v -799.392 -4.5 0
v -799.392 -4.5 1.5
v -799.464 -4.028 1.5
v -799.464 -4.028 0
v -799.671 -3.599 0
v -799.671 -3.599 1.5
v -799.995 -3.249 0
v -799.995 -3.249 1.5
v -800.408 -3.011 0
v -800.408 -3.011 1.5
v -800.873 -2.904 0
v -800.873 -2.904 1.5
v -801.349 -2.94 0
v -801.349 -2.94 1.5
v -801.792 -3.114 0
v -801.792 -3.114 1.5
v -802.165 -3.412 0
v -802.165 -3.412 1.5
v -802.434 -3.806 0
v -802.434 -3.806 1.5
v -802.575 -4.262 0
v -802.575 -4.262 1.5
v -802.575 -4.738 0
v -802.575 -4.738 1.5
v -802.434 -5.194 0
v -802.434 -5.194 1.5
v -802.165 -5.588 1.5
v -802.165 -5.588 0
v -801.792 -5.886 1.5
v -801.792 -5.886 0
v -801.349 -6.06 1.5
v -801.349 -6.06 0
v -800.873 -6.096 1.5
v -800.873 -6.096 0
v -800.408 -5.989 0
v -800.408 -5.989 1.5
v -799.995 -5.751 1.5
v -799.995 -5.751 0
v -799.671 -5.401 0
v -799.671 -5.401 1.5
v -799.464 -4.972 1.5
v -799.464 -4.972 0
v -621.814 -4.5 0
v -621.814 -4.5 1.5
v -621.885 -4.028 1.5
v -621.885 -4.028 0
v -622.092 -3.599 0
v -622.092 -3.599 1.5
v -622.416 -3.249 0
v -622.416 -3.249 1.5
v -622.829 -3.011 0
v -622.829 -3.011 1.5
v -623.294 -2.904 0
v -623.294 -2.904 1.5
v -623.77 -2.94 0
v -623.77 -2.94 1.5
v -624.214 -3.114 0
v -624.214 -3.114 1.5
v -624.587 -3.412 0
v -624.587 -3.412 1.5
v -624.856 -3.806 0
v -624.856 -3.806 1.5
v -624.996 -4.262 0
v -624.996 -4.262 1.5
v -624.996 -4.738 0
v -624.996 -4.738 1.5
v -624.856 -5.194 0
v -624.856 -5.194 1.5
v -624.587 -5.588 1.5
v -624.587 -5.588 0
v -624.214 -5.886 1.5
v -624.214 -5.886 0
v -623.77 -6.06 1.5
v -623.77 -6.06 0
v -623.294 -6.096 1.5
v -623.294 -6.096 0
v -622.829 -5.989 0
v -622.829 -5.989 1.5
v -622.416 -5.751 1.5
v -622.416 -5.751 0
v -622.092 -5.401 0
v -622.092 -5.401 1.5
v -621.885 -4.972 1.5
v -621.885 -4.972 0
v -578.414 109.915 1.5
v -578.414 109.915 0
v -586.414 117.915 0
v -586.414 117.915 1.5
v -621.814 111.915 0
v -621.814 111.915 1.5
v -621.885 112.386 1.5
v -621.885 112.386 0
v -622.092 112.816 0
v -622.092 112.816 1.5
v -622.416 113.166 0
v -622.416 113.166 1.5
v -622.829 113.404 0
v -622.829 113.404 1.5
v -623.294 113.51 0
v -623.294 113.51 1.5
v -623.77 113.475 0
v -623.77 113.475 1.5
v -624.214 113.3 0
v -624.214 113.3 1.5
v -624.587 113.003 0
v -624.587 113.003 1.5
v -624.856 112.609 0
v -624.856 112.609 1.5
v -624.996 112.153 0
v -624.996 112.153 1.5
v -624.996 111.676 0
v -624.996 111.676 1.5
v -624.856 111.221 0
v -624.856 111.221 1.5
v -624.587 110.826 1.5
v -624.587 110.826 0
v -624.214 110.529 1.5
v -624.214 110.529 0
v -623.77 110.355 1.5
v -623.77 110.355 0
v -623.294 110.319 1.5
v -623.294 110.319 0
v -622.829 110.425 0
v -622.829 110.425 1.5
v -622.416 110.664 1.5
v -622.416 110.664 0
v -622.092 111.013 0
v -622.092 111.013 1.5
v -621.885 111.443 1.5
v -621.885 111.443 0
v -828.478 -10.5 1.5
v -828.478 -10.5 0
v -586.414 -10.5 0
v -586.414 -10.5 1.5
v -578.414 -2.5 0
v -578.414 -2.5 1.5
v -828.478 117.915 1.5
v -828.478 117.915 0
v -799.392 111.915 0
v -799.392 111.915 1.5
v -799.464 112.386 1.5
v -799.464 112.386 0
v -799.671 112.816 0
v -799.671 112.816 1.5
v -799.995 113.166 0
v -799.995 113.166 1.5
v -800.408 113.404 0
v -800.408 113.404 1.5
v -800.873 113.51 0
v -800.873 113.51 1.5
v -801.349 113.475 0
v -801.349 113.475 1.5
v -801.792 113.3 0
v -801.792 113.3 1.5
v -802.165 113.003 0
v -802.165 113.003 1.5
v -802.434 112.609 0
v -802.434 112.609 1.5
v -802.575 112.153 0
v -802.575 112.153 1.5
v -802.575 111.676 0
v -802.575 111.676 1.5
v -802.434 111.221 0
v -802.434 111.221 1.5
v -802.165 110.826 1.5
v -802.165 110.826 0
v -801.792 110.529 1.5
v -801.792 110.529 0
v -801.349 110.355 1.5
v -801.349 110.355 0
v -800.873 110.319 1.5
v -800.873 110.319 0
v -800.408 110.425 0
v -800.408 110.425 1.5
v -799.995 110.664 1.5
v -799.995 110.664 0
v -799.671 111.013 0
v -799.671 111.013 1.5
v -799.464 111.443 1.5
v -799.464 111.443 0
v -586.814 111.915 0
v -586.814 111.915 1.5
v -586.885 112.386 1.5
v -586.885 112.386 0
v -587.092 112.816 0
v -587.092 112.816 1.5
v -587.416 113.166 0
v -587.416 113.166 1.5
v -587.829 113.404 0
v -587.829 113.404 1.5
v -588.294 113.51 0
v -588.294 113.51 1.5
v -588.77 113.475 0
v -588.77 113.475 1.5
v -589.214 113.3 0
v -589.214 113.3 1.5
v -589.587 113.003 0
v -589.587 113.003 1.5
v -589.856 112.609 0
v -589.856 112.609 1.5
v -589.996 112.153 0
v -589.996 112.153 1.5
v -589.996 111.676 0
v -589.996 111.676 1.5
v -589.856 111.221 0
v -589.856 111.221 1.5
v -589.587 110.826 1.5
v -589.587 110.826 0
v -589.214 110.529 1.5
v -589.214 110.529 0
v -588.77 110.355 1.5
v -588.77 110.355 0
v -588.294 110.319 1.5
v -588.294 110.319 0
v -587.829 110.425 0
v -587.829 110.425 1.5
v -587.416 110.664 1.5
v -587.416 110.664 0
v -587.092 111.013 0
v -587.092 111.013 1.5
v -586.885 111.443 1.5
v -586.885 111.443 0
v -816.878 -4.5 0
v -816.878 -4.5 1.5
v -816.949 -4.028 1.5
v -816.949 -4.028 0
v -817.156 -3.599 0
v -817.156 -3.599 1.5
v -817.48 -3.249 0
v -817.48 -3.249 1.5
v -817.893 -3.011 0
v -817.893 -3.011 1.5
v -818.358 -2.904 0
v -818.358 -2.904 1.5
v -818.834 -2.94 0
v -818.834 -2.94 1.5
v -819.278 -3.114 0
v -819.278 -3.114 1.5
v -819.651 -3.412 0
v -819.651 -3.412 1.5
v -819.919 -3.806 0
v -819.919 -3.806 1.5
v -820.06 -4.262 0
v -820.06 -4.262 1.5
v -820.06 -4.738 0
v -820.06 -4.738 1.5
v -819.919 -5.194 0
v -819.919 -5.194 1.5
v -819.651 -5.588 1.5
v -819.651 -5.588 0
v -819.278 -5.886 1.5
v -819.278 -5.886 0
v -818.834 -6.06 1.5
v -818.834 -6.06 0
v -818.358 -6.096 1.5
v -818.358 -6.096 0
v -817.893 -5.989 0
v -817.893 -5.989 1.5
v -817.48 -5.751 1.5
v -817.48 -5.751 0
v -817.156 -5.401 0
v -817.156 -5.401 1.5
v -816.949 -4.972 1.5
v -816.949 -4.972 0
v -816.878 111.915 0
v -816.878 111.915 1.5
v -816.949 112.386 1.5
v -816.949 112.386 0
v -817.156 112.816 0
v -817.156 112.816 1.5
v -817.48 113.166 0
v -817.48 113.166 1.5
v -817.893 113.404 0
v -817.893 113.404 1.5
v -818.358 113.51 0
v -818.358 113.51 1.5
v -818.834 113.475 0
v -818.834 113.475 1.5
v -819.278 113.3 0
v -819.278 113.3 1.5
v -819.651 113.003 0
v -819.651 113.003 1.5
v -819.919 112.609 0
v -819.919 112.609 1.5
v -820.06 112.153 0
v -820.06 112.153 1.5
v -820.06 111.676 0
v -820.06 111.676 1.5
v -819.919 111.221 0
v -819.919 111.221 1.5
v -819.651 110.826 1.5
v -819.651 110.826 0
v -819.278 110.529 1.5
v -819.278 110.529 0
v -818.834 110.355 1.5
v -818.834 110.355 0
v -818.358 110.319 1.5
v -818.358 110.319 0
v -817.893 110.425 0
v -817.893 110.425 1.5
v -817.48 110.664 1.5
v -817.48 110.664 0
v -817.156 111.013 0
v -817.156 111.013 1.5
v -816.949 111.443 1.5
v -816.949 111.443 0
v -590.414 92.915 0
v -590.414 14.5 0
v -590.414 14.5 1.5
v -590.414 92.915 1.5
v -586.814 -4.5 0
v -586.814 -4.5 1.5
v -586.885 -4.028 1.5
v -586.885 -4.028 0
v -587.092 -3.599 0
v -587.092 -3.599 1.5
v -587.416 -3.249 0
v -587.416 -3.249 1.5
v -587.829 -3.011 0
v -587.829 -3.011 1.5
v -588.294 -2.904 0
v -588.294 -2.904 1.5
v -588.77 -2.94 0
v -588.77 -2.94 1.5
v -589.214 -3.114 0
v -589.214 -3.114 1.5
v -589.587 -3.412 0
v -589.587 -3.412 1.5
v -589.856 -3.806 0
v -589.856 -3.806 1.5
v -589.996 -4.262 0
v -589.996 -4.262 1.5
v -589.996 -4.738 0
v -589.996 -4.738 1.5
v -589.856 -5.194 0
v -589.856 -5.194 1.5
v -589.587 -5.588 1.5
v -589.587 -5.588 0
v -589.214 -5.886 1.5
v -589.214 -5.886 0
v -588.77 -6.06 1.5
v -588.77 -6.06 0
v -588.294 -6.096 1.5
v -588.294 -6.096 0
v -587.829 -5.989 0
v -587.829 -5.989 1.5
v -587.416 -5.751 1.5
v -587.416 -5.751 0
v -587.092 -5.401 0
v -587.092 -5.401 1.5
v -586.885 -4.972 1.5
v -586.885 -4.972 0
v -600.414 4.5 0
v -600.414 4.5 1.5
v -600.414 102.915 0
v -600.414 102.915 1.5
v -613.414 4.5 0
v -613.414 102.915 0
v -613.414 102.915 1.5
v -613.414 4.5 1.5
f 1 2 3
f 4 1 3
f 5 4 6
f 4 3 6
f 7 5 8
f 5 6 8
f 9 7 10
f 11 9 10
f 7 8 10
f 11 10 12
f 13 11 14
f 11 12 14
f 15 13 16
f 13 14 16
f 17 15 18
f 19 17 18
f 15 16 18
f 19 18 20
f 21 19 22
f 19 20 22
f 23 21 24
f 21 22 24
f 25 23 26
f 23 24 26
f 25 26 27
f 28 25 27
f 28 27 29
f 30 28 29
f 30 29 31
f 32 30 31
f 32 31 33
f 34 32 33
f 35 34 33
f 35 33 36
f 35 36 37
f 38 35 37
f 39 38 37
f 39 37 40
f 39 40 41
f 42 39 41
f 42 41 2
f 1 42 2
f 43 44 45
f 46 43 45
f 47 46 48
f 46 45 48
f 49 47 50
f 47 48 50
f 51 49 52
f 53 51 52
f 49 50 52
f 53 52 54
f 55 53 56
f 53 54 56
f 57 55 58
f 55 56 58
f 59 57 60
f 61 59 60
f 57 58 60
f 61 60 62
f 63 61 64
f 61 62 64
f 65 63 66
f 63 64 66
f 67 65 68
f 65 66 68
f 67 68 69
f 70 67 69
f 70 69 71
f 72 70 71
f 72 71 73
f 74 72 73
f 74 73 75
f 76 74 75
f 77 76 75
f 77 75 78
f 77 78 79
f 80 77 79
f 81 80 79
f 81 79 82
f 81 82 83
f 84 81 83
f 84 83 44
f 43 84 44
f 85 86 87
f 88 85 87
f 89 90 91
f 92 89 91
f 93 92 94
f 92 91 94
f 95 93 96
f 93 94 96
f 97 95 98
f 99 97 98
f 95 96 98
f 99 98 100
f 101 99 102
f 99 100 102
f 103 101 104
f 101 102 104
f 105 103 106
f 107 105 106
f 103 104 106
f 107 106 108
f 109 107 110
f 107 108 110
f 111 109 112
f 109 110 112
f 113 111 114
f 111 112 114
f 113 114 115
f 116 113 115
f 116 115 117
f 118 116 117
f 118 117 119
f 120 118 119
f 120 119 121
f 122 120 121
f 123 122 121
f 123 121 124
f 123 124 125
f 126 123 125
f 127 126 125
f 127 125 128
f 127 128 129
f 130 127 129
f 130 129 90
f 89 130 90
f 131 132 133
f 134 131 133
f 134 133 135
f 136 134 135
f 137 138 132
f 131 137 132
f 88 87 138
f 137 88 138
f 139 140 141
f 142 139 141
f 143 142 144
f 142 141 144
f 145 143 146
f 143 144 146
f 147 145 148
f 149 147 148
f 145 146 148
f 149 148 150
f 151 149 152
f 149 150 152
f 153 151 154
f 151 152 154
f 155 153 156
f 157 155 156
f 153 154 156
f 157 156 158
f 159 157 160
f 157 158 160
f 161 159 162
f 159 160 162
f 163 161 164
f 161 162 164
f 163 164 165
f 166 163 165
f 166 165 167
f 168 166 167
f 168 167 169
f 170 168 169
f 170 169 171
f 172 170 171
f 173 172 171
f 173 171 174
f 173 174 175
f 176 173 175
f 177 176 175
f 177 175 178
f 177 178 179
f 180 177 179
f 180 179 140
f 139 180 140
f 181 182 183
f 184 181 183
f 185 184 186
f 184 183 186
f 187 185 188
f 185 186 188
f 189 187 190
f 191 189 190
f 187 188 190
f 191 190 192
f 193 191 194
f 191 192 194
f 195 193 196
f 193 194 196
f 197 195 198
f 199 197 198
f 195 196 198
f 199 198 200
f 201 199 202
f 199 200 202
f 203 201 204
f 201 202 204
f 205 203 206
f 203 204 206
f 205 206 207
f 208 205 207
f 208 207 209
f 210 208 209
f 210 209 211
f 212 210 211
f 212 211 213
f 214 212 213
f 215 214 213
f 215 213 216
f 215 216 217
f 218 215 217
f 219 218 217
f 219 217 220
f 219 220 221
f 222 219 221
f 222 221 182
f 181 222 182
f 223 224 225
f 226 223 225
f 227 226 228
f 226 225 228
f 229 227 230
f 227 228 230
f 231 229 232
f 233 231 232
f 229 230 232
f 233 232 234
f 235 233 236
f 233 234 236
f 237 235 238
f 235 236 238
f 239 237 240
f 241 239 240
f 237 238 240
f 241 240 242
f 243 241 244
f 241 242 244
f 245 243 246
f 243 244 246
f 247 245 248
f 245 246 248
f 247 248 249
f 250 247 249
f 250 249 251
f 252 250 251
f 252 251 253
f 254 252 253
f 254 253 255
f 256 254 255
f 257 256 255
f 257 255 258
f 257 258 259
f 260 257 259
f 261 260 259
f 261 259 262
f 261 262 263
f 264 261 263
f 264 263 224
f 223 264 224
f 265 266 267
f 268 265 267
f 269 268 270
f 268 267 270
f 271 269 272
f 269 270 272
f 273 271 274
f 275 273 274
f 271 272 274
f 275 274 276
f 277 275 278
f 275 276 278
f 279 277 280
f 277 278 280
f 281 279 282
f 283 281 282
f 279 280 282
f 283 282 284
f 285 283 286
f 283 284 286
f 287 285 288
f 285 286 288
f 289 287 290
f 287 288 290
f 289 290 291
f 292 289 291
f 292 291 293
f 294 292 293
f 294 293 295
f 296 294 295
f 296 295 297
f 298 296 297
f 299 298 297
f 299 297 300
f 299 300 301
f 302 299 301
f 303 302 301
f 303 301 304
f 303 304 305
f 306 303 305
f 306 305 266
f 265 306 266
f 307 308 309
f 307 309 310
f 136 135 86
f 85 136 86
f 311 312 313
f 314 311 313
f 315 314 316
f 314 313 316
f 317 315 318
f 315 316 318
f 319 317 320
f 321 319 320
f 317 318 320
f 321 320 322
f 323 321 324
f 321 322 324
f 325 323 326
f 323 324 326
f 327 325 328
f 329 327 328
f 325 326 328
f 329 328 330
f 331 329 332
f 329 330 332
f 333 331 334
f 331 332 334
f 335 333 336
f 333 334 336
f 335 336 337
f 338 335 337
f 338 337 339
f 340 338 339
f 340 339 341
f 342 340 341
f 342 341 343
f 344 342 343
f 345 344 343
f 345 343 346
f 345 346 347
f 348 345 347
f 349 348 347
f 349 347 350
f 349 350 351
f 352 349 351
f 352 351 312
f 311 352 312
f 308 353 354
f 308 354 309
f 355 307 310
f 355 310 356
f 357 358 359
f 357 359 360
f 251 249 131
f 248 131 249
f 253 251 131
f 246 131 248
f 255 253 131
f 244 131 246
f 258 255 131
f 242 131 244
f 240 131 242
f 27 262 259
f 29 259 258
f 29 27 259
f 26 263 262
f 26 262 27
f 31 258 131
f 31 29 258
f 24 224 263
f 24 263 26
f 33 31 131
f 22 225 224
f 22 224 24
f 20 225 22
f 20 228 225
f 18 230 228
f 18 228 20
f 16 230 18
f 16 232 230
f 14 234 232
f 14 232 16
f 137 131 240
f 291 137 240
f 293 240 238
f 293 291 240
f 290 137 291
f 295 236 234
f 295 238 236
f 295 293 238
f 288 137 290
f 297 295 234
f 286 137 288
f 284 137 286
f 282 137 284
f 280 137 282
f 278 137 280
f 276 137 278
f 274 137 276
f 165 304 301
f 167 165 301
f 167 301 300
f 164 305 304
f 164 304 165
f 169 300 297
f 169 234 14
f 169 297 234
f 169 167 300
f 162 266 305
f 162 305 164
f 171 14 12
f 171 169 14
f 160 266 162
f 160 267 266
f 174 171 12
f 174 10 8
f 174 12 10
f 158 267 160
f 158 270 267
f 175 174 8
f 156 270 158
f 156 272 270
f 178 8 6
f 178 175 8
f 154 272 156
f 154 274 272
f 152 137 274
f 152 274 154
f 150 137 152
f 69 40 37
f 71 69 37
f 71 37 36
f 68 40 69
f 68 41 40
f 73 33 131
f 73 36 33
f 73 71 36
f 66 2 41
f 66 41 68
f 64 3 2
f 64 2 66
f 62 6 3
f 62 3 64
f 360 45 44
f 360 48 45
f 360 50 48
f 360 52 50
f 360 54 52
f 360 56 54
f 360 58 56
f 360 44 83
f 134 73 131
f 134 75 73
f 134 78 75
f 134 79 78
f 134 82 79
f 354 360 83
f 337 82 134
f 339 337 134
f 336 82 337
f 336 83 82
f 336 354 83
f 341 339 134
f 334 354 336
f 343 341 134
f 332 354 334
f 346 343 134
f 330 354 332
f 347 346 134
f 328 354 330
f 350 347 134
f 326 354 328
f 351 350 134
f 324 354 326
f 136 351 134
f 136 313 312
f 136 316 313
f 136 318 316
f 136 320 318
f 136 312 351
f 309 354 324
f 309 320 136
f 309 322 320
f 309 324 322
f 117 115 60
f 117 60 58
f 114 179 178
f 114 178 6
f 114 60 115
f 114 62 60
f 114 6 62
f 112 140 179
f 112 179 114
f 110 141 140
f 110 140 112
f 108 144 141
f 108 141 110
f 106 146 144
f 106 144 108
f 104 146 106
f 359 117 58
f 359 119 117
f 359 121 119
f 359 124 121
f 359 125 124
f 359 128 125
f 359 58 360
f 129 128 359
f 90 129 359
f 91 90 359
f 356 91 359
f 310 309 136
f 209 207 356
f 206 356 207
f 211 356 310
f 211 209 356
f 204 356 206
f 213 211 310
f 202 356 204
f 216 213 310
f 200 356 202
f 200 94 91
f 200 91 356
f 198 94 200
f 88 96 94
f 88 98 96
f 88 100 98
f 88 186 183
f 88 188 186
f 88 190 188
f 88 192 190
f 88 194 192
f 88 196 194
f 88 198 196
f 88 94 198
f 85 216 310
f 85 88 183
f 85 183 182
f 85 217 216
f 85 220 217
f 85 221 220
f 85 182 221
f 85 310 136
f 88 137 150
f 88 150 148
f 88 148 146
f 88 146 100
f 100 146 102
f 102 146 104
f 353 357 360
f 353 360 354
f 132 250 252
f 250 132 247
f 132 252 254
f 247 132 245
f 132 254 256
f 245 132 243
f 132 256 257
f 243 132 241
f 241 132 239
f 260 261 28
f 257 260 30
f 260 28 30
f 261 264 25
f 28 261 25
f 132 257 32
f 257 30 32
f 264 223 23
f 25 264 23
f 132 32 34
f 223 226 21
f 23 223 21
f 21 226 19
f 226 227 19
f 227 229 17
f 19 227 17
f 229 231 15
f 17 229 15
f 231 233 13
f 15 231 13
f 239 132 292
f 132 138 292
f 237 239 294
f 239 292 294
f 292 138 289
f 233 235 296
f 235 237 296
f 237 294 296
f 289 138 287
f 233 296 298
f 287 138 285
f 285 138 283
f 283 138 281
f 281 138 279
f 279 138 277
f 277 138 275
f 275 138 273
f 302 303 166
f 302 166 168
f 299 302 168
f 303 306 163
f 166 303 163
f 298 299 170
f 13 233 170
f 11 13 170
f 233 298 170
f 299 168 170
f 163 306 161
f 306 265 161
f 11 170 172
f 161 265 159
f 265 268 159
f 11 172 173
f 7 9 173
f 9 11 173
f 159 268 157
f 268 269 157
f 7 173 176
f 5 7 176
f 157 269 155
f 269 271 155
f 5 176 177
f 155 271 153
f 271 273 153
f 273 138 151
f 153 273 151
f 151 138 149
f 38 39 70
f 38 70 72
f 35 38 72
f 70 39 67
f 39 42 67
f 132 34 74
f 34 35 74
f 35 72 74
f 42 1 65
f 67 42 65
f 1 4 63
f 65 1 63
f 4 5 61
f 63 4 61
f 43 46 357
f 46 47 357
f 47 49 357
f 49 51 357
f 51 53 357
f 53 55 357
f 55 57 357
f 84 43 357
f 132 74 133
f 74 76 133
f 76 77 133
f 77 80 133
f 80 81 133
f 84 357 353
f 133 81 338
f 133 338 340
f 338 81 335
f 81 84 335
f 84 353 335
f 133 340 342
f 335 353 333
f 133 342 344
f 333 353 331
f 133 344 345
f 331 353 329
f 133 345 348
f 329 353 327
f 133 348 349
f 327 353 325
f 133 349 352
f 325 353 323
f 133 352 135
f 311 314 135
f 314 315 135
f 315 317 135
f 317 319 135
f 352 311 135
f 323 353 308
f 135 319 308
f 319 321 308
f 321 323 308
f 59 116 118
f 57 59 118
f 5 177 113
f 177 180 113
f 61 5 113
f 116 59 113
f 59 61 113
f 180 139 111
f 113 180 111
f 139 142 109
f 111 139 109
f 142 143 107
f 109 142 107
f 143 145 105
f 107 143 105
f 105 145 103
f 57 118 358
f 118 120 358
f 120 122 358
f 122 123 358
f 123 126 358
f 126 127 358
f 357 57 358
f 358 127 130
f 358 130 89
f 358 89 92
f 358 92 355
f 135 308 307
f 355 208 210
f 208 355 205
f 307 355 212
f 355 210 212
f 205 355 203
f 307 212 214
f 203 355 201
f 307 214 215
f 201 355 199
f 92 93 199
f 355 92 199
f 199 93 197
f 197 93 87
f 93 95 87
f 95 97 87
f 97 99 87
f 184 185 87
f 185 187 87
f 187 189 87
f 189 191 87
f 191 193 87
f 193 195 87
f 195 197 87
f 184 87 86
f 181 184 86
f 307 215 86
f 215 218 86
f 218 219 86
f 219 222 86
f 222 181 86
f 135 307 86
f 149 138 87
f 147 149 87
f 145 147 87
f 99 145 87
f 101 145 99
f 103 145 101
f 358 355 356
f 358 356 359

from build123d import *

# Parameters (mm, degrees)
BOSS_EXTRUDE1_DEPTH = 1.5
SKETCH2_R           = 1.6
CUT_EXTRUDE1_DEPTH  = 3.5


with BuildPart() as part:
    # Sketch1 → Boss-Extrude1 (new body)
    with BuildSketch(Plane.XY):
        Polygon((-586.414001465, 117.914742868), (-828.47776474, 117.914742868), (-828.47776474, -10.5), (-586.414001465, -10.5), (-578.414001465, -2.5), (-578.414001465, 109.914742868), align=None)
        Polygon((-613.414001465, 4.5), (-600.414001465, 4.5), (-590.414001465, 14.5), (-590.414001465, 92.914742868), (-600.414001465, 102.914742868), (-613.414001465, 102.914742868), align=None, mode=Mode.SUBTRACT)
    extrude(amount=BOSS_EXTRUDE1_DEPTH)

    # Sketch2 → Cut-Extrude1 (cut)
    with BuildSketch(Plane.XY.offset(1.5)):
        with Locations((-818.47776474, -4.5)):
            Circle(SKETCH2_R)
        with Locations((-800.992483366, -4.5)):
            Circle(SKETCH2_R)
        with Locations((-623.414001465, -4.5)):
            Circle(SKETCH2_R)
        with Locations((-588.414001465, -4.5)):
            Circle(SKETCH2_R)
        with Locations((-623.414001465, 111.914742868)):
            Circle(SKETCH2_R)
        with Locations((-588.414001465, 111.914742868)):
            Circle(SKETCH2_R)
        with Locations((-818.47776474, 111.914742868)):
            Circle(SKETCH2_R)
        with Locations((-800.992483366, 111.914742868)):
            Circle(SKETCH2_R)
    extrude(amount=-CUT_EXTRUDE1_DEPTH, mode=Mode.SUBTRACT)


solid = part.part
